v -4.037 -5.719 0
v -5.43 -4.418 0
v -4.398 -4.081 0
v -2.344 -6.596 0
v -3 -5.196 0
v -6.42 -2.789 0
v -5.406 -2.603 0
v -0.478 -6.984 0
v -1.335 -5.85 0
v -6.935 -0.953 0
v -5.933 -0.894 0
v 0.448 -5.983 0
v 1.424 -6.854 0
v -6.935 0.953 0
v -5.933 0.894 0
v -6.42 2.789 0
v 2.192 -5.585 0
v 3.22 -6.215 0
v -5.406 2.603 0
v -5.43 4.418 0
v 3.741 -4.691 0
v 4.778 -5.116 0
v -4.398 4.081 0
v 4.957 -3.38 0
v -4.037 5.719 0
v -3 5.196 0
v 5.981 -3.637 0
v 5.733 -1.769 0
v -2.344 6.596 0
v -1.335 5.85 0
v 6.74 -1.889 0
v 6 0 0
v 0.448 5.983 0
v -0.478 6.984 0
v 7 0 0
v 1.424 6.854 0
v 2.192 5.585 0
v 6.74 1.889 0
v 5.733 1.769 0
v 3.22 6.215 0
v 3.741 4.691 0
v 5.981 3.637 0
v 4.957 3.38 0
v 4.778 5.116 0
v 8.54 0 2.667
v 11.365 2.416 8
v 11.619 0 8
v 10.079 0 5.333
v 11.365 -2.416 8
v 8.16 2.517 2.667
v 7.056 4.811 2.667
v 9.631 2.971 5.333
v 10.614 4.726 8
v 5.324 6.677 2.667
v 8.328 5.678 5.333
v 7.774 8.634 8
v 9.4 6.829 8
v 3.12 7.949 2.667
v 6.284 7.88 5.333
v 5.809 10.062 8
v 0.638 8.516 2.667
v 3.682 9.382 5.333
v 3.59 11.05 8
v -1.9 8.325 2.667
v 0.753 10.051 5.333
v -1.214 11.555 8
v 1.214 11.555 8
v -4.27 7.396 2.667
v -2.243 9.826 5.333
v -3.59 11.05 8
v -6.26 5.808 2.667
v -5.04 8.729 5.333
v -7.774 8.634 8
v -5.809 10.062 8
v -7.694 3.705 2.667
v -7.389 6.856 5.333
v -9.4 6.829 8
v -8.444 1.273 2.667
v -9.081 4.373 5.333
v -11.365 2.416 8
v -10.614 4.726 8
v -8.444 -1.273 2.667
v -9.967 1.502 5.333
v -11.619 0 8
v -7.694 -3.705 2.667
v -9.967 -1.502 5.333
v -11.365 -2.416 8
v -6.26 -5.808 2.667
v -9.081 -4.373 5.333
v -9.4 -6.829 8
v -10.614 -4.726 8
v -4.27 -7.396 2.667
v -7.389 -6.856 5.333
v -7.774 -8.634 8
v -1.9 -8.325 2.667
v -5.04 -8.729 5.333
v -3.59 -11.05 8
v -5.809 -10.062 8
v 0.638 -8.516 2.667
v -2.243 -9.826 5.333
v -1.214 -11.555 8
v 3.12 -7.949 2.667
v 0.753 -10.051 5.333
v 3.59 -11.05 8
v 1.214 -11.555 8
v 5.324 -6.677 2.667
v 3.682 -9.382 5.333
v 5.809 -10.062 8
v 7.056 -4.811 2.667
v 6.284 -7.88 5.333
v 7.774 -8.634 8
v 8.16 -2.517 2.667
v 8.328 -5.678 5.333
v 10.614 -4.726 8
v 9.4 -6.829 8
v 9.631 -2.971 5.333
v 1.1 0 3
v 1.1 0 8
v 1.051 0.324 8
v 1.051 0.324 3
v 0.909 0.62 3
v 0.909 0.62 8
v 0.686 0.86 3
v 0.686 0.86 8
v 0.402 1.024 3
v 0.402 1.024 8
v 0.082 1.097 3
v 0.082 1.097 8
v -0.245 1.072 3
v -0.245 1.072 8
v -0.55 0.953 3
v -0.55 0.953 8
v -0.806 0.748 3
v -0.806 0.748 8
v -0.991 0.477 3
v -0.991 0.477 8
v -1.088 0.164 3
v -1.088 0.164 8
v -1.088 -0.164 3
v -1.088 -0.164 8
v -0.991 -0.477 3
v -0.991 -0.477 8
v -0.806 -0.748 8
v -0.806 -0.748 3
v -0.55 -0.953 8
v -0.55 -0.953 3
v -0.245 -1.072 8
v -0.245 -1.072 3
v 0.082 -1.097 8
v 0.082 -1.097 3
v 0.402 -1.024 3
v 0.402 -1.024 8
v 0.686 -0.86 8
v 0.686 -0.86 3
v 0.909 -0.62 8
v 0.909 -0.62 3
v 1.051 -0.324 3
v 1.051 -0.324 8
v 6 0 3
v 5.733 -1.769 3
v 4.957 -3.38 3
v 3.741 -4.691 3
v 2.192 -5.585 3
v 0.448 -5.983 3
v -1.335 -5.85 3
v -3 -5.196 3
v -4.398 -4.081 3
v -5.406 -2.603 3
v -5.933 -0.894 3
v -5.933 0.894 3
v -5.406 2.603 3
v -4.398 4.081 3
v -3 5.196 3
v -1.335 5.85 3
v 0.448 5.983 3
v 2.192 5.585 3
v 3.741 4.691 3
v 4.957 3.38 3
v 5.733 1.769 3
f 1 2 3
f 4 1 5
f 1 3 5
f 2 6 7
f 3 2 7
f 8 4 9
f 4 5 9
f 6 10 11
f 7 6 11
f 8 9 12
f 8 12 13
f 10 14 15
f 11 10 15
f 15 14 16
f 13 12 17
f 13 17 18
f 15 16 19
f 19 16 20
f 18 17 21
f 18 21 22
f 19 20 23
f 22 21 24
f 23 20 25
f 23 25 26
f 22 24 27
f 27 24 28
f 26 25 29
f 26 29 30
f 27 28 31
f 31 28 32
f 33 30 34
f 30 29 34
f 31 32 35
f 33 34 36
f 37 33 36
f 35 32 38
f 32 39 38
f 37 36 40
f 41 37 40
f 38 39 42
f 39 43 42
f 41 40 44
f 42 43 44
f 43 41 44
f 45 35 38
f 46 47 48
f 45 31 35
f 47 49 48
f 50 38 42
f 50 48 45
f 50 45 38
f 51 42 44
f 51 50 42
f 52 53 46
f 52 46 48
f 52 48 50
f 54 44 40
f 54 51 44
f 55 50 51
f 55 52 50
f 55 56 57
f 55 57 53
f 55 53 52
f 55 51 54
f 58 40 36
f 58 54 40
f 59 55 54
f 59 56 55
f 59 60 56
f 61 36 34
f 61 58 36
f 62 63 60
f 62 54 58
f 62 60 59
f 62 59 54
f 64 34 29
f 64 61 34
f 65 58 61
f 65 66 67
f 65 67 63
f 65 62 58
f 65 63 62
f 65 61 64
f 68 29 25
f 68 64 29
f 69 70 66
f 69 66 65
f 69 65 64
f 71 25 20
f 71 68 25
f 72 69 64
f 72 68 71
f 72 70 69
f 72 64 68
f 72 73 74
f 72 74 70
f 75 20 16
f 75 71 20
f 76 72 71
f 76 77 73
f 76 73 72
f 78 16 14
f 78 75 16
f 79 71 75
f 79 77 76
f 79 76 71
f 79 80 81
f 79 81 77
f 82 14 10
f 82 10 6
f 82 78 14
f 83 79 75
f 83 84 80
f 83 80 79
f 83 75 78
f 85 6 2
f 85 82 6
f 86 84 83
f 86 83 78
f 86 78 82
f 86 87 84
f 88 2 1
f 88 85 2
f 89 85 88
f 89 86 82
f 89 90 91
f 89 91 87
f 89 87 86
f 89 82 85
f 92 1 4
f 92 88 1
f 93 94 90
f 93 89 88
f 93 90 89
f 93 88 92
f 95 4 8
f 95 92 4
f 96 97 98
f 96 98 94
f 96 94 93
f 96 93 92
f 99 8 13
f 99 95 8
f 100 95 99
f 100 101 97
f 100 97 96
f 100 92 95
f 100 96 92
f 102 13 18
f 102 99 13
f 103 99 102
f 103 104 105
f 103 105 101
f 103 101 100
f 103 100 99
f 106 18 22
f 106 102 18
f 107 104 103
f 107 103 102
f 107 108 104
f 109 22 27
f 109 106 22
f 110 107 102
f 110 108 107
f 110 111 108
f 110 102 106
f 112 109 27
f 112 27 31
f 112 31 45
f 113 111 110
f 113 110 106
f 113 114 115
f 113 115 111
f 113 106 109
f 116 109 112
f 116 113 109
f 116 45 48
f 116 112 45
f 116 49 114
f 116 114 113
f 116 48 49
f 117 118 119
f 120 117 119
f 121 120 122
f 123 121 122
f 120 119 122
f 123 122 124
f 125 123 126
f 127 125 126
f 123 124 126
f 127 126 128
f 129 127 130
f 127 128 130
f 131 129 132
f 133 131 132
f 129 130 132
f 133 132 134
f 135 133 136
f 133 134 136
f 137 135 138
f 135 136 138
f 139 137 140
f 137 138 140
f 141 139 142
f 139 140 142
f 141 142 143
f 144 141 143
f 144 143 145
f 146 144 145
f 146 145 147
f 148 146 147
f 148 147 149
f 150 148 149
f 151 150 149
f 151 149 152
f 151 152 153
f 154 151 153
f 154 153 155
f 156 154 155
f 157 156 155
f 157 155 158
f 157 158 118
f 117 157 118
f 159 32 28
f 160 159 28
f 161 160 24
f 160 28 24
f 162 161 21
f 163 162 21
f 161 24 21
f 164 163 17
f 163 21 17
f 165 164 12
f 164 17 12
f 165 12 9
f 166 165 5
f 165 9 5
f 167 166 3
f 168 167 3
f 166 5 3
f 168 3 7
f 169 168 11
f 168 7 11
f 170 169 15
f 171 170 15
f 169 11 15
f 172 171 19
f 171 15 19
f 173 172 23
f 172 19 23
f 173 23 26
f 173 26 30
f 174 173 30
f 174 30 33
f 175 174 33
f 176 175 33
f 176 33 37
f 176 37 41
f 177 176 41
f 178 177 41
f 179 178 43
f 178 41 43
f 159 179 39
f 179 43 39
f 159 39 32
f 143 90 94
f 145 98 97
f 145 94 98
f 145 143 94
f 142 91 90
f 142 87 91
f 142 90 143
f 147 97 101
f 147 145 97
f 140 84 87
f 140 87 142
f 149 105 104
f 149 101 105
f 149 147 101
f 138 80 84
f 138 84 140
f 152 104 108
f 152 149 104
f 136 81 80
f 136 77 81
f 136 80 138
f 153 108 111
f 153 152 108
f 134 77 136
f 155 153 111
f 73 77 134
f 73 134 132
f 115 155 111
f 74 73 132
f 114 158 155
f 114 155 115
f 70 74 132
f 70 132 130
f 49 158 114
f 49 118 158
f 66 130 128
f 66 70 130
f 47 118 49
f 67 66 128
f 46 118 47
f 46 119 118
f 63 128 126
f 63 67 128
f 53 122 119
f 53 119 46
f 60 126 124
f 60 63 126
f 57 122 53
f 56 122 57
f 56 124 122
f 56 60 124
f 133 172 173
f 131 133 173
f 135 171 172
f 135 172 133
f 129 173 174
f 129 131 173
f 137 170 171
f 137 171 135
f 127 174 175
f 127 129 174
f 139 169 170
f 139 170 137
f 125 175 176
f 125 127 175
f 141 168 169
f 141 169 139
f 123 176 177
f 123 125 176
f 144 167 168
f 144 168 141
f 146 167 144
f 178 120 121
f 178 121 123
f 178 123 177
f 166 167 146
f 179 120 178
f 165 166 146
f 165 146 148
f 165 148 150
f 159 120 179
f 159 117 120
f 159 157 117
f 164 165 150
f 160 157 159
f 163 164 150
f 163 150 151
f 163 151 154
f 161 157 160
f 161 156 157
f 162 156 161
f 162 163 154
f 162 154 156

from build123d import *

# Parameters (mm, degrees)
F0_R     = 7
F1_DEPTH = 8
F1_TAPER = -30
F2_R     = 6
F3_DEPTH = 3
F4_R     = 1.1
F5_DEPTH = 25


with BuildPart() as f1:
    # F0 (on Top) → F1 (new body)
    with BuildSketch(Plane.XY):
        Circle(F0_R)
    extrude(amount=F1_DEPTH, taper=F1_TAPER)

    # F2 (on face) → F3 (cut)
    with BuildSketch(Plane(origin=(0, 0, 0), x_dir=(1, 0, 0), z_dir=(0, 0, -1))):
        Circle(F2_R)
    extrude(amount=-F3_DEPTH, mode=Mode.SUBTRACT)

    # F4 (on face) → F5 (cut)
    with BuildSketch(Plane.XY.offset(8)):
        Circle(F4_R)
    extrude(amount=-F5_DEPTH, mode=Mode.SUBTRACT)


solid = f1.part
